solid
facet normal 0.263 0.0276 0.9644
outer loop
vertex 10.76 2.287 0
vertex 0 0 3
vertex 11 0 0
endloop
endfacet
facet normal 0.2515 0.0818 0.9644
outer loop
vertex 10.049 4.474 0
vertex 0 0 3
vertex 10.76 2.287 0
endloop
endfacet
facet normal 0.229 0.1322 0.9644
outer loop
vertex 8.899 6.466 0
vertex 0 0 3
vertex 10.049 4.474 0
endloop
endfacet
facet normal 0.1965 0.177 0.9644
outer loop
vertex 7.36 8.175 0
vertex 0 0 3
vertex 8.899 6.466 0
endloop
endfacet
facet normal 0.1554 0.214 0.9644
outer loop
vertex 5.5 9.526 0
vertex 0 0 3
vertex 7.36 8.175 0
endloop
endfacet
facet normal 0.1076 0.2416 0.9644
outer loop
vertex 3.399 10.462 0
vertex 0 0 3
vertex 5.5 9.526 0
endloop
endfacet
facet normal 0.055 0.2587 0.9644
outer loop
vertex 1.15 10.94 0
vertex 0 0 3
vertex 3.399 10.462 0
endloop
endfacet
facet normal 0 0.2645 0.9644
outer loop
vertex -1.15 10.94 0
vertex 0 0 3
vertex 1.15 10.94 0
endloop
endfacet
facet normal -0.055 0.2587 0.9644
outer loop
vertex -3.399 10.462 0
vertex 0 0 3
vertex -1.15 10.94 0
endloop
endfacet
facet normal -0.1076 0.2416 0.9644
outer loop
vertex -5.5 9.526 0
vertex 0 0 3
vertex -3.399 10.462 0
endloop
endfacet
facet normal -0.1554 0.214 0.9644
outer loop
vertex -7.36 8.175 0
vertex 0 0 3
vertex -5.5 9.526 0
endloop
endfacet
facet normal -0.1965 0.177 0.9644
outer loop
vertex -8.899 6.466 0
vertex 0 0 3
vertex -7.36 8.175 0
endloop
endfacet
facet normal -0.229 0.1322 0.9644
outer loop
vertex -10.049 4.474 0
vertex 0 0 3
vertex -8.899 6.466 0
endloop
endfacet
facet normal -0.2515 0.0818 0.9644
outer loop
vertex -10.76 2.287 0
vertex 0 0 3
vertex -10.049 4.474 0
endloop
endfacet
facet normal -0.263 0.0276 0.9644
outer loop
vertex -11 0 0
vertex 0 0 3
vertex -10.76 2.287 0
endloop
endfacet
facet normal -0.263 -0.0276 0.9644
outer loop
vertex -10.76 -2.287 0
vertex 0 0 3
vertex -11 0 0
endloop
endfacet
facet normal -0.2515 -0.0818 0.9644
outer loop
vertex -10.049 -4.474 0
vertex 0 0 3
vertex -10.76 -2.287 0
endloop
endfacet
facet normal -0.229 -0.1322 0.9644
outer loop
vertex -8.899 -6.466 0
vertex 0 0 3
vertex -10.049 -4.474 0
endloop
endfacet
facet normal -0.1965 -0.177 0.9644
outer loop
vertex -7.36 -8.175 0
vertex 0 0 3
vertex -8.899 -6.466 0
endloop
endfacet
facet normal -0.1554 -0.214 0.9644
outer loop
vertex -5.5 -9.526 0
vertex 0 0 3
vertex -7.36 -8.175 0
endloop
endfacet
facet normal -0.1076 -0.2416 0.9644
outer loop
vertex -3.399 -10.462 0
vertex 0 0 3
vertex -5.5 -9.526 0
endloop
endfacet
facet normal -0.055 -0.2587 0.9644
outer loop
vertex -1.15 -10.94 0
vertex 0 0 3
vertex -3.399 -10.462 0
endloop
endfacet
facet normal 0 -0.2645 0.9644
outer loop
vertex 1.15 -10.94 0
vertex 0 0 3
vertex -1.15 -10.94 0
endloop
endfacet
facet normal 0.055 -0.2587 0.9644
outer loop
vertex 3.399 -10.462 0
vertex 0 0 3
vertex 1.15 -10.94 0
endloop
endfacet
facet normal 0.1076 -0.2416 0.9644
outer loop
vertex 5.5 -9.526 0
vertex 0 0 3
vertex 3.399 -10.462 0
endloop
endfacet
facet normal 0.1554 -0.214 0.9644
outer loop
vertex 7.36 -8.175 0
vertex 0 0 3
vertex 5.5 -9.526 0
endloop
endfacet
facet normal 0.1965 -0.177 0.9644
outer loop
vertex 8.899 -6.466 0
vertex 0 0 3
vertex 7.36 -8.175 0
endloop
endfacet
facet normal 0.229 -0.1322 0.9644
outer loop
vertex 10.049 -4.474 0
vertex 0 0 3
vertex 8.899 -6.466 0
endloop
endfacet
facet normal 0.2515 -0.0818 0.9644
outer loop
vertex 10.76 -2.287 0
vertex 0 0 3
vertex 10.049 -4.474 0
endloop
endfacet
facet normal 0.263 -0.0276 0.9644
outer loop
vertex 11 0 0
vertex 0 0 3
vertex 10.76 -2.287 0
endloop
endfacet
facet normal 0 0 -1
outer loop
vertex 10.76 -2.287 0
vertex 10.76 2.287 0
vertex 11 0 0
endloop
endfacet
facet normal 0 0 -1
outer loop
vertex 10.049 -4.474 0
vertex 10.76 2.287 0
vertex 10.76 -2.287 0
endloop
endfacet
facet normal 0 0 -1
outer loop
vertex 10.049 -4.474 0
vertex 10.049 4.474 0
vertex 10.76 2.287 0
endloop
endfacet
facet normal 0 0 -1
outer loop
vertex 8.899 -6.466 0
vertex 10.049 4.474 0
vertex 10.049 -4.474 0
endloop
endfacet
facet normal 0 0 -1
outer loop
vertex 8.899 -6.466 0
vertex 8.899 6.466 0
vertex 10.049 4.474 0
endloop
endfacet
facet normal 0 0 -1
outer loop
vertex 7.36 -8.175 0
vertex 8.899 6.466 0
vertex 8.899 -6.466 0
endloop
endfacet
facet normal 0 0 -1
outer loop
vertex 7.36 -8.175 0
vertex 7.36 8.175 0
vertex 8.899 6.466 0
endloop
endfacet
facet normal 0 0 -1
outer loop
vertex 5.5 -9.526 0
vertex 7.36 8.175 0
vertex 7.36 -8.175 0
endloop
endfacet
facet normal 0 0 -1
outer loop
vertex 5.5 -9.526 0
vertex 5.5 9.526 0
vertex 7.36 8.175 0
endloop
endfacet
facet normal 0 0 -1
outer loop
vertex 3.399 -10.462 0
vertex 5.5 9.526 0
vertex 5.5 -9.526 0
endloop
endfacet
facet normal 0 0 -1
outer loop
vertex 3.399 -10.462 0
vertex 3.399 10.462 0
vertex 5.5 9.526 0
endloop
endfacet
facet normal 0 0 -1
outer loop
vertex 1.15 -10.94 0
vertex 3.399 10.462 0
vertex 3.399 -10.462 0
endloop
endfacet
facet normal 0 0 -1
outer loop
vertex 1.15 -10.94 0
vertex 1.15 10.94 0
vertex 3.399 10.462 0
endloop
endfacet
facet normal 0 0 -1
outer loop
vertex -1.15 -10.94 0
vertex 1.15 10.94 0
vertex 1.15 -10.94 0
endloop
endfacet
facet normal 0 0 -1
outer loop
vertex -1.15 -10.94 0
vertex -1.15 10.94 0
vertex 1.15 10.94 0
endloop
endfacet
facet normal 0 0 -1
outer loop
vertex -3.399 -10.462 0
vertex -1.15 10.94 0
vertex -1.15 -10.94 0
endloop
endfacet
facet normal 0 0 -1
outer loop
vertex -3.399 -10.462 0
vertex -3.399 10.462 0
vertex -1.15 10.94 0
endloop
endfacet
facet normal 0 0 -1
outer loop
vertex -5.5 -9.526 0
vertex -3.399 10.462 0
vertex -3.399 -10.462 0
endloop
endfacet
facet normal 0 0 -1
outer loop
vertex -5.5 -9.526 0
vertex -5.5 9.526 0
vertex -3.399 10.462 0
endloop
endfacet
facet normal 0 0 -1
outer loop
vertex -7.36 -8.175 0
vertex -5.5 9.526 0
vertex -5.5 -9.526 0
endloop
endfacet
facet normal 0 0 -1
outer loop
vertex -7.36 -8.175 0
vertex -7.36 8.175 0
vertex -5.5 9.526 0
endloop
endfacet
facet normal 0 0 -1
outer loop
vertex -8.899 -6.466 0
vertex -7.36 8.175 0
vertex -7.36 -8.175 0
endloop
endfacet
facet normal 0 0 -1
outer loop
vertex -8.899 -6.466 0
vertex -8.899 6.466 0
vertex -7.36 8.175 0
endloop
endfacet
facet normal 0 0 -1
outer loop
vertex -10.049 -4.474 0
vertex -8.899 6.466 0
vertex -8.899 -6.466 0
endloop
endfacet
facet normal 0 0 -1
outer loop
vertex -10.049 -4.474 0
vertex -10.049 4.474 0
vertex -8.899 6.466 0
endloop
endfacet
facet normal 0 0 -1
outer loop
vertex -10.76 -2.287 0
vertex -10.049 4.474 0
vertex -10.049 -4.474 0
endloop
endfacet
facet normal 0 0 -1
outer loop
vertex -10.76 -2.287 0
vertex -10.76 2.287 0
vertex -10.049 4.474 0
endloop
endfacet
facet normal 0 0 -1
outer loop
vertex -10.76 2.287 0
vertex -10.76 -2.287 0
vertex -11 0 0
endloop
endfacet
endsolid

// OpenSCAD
// Generated by SolidPython 1.0.1 on 2020-07-29 00:39:25


cylinder(h = 3, r1 = 11, r2 = 0);
/***********************************************
*********      SolidPython code:      **********
************************************************
 
# import packages: SolidPython
from solid import *
from solid.utils import *
from itertools import chain, combinations


class Resize:

    def __init__(self, scad_file):
        self.scad_file = scad_file
        #self.scad_file = import_scad(scad_file)
        # cone/cylinder param:
        self.r1 = 0
        self.r2 = 0
        self.h = 0
        # rectangular prism param:
        self.w = 0
        self.l = 0
        # ellipse param:
        self.r = 0

    # import OpenScad code (file name corresponds to shape)


    # classify shape + parameters
    def assign(self, param1, param2, param3):
        if self.scad_file == 'cone.scad':
            self.r1 = param1
            self.r2 = param2
            self.h = param3
        elif self.scad_file == 'cylinder.scad':
            self.r1 = param1
            self.r2 = param2
            self.h = param3
        elif self.scad_file == 'rectangularPrism.scad':
            self.h = param1
            self.l = param2
            self.w = param3
        else:
            self.r = param1
            self.h = param2

    # resize parameters
    def iterate(self):
        x = range(3, 20, 2)
        i = 1
        if self.scad_file == 'cone.scad':
            tempList = list(combinations(x, 2))
            for temp in tempList:
                param1 = temp[0]
                param2 = temp[1]
                filepath = 'produced_scad_files/' + 'cone' + str(param1) + '_' + str(param2) + '_' + '.scad'
                scad_render_to_file(cylinder(h=param1, r1=param2, r2=0), filepath)

        elif self.scad_file == 'cylinder.scad':
            tempList = list(combinations(x, 3))
            for temp in tempList:
                param1 = temp[0]
                param2 = temp[1]
                filepath = 'produced_scad_files/' + 'cylinder' + str(param1) + '_' + str(param2) + '_' + '.scad'
                scad_render_to_file(cylinder(h=param1, r1=param2, r2=param2), filepath)

        elif self.scad_file == 'rectangularPrism.scad':
            tempList = list(combinations(x, 3))
            for temp in tempList:
                param1 = temp[0]
                param2 = temp[1]
                param3 = temp[2]
                filepath = 'produced_scad_files/' + 'rectangularPrism' + str(param1) + '_' + str(param2) + '_' + str(
                    param3) + '.scad'
                scad_render_to_file(cube(size=(param1, param2, param3)), filepath)

        elif self.scad_file == 'ellipse.scad':
            tempList = list(combinations(x, 4))
            for temp in tempList:
                param1 = temp[0]
                param2 = temp[1]
                param3 = temp[2]
                param4 = temp[3]
                filepath = 'produced_scad_files/' + 'ellipse' + str(param1) + '_' + str(param2) + '_' + str(param3) + '_' + str(param4) + '.scad'
                scad_render_to_file(scale([param1, param2, param3])(sphere(r=param4)), filepath)

    def render_to_scadfile(self):
        scad_render_to_file(scad, 'example.scad') 
 
************************************************/
